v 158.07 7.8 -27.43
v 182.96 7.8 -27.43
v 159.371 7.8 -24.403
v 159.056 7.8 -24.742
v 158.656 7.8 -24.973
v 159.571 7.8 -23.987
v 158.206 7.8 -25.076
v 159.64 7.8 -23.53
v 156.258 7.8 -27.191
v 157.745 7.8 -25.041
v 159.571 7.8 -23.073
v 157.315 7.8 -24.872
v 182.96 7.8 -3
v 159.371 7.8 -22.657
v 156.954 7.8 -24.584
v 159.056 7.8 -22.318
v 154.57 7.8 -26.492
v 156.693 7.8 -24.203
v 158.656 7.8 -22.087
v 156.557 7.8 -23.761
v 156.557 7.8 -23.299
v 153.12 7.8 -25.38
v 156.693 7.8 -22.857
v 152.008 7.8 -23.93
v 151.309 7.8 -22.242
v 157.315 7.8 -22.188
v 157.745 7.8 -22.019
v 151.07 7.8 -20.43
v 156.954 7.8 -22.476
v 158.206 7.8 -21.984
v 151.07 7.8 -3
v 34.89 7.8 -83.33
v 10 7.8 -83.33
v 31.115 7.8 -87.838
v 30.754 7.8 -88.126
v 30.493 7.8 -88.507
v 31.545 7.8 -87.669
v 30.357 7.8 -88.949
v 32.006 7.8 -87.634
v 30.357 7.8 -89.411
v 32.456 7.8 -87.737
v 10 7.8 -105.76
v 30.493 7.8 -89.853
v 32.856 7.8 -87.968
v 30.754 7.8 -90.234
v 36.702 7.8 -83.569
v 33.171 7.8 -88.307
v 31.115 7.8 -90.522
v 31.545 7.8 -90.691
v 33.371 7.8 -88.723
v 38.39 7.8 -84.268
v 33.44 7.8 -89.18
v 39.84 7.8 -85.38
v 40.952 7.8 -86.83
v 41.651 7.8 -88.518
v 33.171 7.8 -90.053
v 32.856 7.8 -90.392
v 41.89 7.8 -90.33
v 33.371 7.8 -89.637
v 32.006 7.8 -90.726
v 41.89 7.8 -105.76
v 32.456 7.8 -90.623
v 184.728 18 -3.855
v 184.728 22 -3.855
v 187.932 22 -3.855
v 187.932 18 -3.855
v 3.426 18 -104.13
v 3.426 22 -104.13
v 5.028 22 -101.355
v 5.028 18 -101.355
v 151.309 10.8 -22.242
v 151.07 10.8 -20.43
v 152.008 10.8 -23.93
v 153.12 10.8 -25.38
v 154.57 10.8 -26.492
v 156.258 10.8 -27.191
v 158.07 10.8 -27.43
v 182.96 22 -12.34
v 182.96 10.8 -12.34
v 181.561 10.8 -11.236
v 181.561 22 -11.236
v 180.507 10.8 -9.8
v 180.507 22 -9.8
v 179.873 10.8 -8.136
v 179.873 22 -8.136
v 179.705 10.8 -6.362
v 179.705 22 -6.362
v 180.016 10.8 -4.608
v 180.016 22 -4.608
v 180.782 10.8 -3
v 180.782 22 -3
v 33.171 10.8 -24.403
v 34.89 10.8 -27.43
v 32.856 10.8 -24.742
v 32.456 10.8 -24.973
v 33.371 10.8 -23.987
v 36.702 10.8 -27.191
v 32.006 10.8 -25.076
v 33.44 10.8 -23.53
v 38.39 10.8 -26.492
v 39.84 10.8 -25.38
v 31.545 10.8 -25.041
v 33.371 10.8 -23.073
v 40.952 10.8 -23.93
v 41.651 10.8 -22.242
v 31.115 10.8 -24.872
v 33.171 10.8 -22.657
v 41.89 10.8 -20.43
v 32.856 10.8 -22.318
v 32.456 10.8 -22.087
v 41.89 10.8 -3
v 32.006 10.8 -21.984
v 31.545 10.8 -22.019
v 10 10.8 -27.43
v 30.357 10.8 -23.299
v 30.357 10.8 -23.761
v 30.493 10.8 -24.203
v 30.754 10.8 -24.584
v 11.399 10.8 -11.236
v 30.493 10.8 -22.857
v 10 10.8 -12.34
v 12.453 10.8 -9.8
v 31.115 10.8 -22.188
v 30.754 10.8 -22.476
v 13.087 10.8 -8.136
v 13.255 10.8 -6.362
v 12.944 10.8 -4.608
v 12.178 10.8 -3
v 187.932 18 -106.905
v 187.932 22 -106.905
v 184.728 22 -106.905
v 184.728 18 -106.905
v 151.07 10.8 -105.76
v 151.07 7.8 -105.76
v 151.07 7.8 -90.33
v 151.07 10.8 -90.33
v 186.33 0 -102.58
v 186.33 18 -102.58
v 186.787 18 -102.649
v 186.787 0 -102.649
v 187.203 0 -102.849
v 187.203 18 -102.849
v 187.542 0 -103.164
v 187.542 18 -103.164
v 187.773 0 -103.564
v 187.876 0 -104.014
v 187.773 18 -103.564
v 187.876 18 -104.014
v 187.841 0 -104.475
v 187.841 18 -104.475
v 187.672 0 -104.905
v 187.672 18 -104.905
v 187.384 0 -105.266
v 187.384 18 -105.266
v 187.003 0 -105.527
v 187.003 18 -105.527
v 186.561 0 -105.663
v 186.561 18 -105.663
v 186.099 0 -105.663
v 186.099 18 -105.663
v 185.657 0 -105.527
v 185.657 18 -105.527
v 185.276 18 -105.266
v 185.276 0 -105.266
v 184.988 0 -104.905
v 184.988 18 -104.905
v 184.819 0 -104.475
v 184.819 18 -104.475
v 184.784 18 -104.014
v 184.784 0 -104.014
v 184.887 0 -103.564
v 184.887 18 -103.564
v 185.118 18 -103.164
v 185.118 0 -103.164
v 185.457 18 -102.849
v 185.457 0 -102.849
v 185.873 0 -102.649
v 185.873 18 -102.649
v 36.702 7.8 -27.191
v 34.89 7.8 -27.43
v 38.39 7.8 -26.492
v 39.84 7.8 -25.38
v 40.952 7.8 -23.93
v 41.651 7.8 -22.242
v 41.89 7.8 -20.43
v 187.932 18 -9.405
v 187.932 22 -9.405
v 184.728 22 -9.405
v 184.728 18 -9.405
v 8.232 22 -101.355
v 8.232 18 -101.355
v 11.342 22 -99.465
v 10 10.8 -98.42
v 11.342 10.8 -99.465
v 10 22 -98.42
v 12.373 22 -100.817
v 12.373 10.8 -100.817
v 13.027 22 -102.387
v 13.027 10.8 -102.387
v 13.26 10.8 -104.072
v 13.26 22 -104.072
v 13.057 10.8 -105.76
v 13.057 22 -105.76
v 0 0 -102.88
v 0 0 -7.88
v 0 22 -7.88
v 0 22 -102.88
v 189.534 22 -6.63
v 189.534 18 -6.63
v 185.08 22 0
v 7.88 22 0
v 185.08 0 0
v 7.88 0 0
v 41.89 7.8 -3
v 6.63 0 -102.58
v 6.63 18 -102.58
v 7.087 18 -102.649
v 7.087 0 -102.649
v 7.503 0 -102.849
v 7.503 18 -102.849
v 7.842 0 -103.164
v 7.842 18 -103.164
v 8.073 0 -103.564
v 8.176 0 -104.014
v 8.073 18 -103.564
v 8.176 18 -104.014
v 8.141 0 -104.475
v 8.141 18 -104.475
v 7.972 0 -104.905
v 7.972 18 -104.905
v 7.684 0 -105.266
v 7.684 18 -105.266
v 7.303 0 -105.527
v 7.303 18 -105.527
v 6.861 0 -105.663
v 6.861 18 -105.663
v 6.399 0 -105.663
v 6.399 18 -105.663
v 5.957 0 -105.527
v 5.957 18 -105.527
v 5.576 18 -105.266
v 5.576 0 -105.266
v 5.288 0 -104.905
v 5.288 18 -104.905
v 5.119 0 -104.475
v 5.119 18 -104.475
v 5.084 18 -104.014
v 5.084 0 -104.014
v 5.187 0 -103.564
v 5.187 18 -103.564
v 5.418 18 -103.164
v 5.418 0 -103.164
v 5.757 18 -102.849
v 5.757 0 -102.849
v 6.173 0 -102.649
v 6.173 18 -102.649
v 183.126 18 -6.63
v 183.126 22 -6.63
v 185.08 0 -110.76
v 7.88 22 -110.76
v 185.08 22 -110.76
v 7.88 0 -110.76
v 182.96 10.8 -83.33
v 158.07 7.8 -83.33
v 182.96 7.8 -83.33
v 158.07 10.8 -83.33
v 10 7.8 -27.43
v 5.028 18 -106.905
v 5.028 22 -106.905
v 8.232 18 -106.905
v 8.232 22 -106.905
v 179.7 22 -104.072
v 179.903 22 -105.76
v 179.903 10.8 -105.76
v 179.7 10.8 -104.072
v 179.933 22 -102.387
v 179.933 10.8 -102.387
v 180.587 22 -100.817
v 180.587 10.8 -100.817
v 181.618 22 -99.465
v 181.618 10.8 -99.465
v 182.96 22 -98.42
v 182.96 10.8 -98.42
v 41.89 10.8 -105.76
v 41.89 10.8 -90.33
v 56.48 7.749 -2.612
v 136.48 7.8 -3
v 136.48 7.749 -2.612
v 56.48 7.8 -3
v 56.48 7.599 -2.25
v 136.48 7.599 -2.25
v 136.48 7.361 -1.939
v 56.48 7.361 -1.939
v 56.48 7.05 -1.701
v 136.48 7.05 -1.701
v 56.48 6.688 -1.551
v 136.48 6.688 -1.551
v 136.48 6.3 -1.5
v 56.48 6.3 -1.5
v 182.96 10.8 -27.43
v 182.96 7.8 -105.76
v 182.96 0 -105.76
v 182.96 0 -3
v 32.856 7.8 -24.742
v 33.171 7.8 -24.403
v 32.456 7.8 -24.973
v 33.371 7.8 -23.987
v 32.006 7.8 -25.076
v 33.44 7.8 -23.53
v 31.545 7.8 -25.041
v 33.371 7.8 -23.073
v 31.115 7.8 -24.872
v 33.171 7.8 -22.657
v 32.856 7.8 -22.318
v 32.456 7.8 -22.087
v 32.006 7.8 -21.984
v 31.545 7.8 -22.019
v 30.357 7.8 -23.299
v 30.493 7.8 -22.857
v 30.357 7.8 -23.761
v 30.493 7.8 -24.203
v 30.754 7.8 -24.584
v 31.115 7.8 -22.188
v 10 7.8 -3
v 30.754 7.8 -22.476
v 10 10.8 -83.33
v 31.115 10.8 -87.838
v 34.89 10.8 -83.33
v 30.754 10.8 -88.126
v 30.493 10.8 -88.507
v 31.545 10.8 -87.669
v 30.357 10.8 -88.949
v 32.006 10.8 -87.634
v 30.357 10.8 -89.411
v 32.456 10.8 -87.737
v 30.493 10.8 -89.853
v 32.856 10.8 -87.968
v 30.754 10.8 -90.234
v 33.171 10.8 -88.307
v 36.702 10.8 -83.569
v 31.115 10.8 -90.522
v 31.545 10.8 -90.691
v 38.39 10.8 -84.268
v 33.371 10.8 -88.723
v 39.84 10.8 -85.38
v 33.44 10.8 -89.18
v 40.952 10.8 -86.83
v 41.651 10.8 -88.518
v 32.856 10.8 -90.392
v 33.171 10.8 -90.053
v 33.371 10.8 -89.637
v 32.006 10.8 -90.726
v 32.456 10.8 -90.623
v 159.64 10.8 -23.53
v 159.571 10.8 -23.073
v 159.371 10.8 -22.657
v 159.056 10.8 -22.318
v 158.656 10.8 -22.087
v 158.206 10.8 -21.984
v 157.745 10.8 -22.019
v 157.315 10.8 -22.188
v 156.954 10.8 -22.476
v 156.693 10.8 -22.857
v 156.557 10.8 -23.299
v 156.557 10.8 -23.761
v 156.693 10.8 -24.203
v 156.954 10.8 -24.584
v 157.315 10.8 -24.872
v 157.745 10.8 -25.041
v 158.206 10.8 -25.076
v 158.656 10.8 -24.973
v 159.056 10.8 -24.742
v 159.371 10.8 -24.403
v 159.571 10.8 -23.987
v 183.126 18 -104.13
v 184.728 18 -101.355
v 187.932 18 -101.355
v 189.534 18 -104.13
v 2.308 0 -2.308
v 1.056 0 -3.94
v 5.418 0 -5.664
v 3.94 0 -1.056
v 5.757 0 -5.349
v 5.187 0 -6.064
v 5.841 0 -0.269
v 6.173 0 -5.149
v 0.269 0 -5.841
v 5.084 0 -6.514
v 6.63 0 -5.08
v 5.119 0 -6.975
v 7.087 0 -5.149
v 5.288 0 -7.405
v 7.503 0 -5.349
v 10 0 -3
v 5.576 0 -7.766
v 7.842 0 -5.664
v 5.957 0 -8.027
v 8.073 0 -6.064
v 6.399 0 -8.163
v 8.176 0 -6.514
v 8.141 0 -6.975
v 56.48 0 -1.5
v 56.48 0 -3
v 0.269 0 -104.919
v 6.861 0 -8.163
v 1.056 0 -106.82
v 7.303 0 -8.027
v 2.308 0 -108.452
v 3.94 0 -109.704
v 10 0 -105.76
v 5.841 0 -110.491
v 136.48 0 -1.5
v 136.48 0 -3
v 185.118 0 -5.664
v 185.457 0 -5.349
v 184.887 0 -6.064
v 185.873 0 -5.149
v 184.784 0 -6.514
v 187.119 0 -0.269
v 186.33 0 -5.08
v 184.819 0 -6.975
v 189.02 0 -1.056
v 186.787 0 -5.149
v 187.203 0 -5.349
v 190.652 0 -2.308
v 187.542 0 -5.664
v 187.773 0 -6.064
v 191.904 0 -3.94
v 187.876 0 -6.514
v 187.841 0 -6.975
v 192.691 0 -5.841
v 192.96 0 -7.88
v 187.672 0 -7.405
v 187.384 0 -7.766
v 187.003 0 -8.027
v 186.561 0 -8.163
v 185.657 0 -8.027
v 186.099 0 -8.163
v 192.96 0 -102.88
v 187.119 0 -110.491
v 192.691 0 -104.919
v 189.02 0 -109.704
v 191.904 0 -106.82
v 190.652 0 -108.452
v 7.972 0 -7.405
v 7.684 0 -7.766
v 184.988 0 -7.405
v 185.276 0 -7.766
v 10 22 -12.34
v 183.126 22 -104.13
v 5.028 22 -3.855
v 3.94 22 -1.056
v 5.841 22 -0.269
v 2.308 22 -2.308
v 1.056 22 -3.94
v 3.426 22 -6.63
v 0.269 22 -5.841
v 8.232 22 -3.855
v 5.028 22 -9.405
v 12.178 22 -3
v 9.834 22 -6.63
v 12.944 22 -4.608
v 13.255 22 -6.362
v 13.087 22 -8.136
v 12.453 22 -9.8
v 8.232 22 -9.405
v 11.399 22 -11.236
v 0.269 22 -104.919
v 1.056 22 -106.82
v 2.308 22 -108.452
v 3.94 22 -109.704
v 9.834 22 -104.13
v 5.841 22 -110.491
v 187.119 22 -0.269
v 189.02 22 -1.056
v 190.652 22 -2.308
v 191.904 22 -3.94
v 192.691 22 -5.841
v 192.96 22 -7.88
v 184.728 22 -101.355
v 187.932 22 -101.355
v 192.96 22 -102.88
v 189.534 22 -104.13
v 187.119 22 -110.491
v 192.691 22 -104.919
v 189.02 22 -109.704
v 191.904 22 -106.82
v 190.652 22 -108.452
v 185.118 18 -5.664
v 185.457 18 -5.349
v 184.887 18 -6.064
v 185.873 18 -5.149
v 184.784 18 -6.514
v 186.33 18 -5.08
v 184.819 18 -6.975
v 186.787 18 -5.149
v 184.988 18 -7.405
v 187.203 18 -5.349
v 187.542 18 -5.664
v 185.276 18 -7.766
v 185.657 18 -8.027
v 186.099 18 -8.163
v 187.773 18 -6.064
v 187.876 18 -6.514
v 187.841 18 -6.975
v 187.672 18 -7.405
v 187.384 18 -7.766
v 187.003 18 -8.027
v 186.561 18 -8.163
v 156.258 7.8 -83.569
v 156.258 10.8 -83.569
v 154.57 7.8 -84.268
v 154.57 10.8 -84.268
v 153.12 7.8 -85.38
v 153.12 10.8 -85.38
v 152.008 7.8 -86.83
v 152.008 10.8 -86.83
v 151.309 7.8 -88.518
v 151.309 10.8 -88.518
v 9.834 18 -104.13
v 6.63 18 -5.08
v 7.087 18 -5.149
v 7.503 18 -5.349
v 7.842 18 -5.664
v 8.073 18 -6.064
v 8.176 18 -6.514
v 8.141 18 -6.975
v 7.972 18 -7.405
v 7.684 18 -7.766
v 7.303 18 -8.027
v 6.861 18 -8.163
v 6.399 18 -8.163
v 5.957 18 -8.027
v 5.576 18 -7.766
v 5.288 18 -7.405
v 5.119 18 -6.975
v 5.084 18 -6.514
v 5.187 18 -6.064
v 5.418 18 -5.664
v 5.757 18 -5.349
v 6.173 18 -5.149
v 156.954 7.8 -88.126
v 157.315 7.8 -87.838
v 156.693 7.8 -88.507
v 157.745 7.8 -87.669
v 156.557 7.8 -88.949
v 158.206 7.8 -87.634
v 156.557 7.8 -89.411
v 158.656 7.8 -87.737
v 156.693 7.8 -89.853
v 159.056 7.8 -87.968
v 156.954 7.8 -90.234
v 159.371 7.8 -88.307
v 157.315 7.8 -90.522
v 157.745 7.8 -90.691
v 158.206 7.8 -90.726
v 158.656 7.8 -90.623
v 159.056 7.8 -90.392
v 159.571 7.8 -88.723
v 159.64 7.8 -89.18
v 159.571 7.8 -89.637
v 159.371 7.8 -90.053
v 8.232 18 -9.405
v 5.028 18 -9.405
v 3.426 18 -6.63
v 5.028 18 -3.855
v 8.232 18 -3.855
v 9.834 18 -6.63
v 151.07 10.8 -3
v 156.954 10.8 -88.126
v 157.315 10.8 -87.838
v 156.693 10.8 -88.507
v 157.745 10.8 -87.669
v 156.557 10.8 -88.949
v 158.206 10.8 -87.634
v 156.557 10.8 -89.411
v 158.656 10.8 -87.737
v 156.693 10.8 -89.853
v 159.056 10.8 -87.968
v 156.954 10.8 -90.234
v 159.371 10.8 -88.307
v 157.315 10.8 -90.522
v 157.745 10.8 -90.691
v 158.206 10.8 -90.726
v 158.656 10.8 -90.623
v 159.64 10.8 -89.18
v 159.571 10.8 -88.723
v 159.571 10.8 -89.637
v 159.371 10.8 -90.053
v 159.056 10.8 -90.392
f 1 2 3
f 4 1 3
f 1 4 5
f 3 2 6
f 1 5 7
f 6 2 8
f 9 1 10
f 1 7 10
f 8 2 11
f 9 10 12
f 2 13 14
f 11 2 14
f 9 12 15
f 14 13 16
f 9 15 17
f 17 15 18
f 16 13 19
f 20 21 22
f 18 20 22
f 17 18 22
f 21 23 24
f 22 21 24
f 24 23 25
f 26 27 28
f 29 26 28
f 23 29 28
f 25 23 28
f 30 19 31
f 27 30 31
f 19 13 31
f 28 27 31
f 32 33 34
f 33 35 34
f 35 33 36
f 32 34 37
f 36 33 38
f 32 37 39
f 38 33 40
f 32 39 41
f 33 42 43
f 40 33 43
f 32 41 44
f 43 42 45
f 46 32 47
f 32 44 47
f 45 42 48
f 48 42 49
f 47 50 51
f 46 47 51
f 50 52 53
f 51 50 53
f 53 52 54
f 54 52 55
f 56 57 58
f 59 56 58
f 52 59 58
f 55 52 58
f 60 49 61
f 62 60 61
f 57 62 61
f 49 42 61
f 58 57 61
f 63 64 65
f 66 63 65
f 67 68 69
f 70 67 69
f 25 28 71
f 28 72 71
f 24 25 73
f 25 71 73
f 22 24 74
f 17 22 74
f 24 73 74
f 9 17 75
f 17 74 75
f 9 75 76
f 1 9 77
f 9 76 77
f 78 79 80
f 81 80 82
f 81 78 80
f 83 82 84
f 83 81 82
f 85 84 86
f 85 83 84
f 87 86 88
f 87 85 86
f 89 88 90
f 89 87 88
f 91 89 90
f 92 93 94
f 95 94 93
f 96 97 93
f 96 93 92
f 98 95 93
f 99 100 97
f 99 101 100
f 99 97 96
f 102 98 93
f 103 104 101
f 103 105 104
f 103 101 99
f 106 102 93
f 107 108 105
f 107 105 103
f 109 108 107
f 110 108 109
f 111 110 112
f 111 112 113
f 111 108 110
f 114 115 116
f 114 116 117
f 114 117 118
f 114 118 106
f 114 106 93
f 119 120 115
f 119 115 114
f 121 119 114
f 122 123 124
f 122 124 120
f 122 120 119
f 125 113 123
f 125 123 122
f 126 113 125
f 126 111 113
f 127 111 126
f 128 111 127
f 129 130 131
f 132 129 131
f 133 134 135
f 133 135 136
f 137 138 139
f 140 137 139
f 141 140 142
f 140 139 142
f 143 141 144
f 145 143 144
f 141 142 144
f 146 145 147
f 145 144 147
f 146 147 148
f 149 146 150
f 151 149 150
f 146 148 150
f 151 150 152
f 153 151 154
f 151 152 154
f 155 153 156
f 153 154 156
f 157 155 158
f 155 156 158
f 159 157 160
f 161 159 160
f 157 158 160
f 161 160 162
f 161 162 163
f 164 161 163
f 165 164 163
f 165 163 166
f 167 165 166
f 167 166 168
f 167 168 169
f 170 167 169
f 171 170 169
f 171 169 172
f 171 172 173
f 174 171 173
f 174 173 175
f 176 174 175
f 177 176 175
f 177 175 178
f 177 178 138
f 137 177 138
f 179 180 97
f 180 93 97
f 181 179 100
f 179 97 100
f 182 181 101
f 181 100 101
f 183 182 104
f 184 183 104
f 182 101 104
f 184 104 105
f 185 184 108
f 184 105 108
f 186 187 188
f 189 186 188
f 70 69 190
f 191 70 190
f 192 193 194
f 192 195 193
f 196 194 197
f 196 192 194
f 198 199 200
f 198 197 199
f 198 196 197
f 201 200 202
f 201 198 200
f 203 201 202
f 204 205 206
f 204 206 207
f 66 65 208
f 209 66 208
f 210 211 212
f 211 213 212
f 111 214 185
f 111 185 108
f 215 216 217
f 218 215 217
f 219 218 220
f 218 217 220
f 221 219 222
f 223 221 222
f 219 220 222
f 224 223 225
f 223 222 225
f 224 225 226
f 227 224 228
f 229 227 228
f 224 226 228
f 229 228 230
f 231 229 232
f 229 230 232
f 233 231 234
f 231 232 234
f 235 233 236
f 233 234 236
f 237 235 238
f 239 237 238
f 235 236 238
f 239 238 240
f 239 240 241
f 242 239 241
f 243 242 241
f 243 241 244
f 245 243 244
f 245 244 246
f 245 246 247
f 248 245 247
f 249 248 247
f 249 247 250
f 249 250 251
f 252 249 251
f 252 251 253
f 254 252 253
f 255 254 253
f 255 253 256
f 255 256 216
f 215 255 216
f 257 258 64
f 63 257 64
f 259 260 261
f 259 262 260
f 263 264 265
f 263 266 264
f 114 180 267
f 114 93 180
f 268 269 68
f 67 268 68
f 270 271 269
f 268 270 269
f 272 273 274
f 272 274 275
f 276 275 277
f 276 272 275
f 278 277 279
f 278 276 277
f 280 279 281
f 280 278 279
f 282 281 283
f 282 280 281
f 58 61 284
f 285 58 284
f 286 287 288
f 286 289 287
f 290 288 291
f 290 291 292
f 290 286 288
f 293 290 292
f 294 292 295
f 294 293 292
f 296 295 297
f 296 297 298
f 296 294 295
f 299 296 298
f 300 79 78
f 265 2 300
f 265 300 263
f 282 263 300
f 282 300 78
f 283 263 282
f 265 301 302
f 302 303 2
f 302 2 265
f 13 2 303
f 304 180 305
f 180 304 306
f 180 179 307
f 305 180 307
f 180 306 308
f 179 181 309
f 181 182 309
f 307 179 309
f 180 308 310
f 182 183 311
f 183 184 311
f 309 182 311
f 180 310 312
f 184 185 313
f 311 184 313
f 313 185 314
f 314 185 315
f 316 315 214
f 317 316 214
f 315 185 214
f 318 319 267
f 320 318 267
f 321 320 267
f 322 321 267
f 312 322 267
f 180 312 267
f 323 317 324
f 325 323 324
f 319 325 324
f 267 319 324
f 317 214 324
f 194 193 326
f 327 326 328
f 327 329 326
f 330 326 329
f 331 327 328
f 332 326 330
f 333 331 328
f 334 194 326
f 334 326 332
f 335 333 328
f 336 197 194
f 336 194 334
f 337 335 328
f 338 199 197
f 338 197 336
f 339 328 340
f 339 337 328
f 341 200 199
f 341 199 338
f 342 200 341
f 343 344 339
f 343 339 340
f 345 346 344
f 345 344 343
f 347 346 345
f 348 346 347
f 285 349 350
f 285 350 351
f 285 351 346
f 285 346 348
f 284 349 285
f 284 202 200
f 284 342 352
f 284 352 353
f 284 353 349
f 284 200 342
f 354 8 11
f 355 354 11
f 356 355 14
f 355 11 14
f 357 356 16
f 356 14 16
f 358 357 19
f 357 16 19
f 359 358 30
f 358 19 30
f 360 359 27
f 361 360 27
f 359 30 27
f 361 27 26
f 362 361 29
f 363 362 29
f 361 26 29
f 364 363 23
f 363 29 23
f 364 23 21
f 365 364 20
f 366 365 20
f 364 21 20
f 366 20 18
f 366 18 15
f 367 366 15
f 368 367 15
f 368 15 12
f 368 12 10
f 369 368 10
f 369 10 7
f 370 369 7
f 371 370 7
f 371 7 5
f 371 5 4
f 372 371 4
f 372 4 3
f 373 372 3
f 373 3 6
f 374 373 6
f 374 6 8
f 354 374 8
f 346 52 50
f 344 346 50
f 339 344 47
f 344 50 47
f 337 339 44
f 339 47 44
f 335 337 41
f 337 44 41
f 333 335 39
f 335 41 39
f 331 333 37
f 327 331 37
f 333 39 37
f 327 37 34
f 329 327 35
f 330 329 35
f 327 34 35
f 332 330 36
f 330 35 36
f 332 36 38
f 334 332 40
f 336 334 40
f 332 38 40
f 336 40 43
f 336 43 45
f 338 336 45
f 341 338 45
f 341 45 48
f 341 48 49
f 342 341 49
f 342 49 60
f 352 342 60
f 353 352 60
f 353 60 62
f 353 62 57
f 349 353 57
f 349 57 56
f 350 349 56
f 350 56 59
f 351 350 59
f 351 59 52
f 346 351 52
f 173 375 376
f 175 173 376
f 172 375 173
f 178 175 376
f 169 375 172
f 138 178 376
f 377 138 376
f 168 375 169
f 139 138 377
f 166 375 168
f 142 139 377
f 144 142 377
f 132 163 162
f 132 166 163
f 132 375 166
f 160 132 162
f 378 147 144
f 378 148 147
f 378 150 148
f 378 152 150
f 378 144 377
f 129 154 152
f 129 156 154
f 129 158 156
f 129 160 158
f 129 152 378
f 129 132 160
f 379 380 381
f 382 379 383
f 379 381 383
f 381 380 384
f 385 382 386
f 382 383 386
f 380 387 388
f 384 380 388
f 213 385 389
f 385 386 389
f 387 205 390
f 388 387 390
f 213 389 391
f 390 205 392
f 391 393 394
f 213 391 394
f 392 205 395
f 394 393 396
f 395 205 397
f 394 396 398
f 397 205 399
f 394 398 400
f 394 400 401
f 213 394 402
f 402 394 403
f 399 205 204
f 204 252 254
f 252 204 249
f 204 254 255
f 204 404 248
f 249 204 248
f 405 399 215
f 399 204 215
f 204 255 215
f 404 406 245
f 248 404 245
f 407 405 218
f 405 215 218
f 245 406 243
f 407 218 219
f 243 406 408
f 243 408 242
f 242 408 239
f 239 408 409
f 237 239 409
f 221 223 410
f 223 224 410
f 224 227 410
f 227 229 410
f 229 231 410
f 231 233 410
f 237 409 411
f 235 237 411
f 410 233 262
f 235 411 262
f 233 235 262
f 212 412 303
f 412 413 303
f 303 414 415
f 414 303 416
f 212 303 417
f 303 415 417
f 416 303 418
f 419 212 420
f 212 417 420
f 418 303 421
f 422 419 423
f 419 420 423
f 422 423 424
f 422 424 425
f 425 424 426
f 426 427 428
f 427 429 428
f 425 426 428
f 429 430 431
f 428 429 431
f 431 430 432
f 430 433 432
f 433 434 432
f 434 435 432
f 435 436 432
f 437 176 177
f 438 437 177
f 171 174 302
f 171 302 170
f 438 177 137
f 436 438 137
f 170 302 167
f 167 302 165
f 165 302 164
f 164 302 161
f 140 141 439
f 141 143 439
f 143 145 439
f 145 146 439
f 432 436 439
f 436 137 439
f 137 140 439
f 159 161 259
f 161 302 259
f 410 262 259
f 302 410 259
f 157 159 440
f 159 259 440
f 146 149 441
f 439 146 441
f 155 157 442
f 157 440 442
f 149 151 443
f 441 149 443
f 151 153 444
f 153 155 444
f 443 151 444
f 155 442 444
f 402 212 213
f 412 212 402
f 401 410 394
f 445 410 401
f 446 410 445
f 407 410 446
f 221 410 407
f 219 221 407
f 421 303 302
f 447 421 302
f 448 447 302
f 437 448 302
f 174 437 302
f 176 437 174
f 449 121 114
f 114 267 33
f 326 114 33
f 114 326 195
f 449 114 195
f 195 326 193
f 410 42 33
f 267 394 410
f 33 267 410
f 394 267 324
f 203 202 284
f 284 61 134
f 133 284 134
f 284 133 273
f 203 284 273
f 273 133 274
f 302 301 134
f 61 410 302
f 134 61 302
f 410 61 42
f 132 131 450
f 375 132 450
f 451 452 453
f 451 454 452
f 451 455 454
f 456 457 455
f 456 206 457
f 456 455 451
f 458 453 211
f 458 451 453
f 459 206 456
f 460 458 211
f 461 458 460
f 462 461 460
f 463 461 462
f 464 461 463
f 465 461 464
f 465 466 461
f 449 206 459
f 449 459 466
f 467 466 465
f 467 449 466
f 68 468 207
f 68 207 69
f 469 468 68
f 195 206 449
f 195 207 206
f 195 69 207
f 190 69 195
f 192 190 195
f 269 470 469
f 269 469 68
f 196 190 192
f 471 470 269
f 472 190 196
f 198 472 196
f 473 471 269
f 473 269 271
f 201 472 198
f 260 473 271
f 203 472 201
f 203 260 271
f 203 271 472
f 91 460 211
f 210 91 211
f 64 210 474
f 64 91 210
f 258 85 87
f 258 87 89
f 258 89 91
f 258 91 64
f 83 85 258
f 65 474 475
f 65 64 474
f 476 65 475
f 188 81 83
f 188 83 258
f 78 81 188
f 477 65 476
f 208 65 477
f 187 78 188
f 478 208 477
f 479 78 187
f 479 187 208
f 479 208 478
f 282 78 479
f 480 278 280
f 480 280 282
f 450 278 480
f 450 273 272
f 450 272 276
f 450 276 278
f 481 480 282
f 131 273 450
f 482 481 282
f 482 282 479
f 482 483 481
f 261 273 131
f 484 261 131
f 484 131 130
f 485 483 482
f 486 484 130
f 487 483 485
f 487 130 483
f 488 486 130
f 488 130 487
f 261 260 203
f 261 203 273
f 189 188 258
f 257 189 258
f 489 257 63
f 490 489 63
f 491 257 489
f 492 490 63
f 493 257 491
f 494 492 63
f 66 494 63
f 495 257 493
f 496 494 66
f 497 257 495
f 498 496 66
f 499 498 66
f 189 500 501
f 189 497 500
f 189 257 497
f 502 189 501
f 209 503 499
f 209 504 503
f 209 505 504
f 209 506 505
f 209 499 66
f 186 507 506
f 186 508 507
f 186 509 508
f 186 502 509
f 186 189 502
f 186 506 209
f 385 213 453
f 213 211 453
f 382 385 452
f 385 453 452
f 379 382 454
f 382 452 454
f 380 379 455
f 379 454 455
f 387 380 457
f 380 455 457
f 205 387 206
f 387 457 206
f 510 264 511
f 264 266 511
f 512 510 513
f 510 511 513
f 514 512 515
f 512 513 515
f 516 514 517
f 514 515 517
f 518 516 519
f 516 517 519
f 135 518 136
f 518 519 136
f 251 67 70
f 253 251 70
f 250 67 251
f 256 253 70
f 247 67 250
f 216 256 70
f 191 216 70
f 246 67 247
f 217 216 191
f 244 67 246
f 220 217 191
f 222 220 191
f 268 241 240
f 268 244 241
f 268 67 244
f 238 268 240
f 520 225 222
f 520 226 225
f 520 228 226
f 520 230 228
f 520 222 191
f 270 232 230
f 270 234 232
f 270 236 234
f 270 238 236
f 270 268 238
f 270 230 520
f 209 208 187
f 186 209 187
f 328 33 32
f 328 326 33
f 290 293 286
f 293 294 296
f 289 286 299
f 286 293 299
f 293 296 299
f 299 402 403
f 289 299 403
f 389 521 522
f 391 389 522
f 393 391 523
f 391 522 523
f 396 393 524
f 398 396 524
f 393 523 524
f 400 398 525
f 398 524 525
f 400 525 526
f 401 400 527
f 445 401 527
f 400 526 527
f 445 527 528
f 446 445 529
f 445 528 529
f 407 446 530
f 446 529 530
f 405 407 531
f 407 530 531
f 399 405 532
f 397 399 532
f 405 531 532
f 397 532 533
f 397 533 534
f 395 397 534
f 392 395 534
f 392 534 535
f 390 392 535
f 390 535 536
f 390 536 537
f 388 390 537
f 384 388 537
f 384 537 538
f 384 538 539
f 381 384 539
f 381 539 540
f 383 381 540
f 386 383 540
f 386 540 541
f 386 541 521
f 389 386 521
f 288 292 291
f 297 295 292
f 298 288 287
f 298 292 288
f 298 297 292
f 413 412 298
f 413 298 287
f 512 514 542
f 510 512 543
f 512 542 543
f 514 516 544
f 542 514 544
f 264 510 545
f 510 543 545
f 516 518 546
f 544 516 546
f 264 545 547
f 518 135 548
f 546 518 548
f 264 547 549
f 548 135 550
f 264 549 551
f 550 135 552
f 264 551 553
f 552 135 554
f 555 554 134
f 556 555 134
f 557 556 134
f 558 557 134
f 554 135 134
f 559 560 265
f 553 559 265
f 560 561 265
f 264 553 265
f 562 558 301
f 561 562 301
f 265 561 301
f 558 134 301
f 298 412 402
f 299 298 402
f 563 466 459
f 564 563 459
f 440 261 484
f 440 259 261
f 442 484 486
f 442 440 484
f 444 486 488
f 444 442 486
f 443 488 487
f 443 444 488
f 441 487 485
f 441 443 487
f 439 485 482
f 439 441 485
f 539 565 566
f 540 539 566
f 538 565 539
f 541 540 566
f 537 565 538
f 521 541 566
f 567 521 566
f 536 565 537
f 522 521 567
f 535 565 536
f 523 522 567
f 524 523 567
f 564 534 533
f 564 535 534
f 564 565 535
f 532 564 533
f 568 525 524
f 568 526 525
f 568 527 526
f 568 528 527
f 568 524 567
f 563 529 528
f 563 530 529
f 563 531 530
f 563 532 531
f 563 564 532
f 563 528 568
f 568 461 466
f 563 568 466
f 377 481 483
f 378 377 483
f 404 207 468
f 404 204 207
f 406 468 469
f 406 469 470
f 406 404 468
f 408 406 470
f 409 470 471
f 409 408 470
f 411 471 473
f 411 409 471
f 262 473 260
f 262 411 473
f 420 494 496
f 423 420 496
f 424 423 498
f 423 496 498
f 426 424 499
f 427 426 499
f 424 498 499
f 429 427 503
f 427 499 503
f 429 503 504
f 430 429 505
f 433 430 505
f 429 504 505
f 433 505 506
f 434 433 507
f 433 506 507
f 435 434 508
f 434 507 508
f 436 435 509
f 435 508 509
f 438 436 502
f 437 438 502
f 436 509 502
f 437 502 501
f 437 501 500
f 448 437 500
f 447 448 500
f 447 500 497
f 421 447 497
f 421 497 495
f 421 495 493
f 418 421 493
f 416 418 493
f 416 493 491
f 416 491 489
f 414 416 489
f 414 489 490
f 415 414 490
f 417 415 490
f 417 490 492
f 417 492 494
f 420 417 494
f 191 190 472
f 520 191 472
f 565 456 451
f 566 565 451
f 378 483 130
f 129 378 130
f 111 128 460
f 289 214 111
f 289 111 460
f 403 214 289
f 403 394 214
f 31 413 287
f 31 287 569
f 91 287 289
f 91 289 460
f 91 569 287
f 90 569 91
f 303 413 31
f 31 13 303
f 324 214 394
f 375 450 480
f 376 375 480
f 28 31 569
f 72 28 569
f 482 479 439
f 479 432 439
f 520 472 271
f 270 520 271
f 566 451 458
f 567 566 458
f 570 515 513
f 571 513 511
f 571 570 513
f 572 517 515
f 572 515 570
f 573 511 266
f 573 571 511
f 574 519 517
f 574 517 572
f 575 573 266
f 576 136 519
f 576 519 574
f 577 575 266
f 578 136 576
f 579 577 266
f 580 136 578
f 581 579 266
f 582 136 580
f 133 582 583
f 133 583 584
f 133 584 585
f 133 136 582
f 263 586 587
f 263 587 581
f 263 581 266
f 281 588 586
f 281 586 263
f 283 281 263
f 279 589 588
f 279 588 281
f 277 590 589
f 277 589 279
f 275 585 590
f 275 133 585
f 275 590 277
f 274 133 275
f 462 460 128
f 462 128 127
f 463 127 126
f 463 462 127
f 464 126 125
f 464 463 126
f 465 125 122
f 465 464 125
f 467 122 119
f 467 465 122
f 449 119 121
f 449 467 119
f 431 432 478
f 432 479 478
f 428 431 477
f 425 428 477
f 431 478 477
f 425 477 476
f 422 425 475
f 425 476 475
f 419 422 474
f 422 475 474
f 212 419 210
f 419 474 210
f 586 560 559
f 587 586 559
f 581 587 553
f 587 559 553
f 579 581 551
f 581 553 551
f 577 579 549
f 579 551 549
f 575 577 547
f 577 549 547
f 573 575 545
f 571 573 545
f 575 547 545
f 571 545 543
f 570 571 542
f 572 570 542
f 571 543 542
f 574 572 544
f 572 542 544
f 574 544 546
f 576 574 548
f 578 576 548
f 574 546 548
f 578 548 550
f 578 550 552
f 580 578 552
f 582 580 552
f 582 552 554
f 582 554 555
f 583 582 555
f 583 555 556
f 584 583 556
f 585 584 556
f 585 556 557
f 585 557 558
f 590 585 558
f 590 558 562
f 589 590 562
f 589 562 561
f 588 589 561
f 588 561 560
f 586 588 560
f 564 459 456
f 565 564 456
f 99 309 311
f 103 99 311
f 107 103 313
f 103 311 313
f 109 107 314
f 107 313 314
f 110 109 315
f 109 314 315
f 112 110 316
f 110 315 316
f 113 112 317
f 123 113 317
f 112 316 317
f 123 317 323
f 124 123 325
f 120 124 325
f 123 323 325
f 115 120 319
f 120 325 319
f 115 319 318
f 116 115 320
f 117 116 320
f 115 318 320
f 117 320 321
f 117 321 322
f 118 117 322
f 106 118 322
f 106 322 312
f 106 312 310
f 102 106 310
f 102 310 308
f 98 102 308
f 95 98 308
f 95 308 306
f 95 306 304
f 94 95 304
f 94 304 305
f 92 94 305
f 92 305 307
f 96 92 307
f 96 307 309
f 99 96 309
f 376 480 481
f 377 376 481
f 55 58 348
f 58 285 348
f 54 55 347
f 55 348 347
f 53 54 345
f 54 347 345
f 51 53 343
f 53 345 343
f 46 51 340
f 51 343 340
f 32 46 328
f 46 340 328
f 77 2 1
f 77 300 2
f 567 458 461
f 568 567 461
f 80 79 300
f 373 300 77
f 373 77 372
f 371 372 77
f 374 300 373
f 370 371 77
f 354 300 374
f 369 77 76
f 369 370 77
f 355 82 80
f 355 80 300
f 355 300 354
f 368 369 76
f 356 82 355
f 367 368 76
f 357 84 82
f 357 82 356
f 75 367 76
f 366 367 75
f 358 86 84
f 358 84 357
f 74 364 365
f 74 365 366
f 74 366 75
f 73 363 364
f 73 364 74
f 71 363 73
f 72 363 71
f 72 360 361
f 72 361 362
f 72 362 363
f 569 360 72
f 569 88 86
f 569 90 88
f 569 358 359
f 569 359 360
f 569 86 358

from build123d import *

# Parameters (mm, degrees)
CROQUIS1_W              = 192.96
CROQUIS1_H              = 110.76
CROQUIS1_W_2            = 172.96
CROQUIS1_H_2            = 102.76
SALIENTE_EXTRUIR2_DEPTH = 18
CROQUIS2_W              = 31.89
CROQUIS2_H              = 3
SALIENTE_EXTRUIR3_DEPTH = 24.43
CROQUIS3_W              = 31.89
CROQUIS3_H              = 3
SALIENTE_EXTRUIR4_DEPTH = 22.43
CROQUIS1_2_W            = 192.96
CROQUIS1_2_H            = 110.76
CROQUIS1_2_W_2          = 172.96
CROQUIS1_2_H_2          = 102.76
SALIENTE_EXTRUIR5_DEPTH = 22
CROQUIS6_R              = 6.63
SALIENTE_EXTRUIR6_DEPTH = 22
CROQUIS7_R              = 1.55
CORTAR_EXTRUIR1_DEPTH   = 22
CORTAR_EXTRUIR2_DEPTH   = 4
REDONDEO1_R             = 7.88
REDONDEO2_R             = 7.88
REDONDEO3_R             = 7.88
REDONDEO4_R             = 7.88
CROQUIS9_R              = 1.55
CORTAR_EXTRUIR3_DEPTH   = 4
CROQUIS10_W             = 172.96
CROQUIS10_H             = 102.76
CORTAR_EXTRUIR5_DEPTH   = 7.8
REDONDEO5_R             = 7
REDONDEO6_R             = 7
REDONDEO7_R             = 7
REDONDEO8_R             = 7
CROQUIS11_W             = 80
CROQUIS11_H             = 1.5
CORTAR_EXTRUIR6_DEPTH   = 7.8
REDONDEO9_R             = 1.5


with BuildPart() as part:
    # Croquis1 → Saliente-Extruir2 (new body)
    with BuildSketch(Plane(origin=(0, 0, 0), x_dir=(1, 0, 0), z_dir=(0, 1, 0))):
        with Locations((96.48, 55.38)):
            Rectangle(CROQUIS1_W, CROQUIS1_H)
        with Locations((96.48, 54.38)):
            Rectangle(CROQUIS1_W_2, CROQUIS1_H_2, mode=Mode.SUBTRACT)
    extrude(amount=SALIENTE_EXTRUIR2_DEPTH)

    # Croquis2 → Saliente-Extruir3 (add)
    with BuildSketch(Plane(origin=(0, 0, -3), x_dir=(-1, 0, 0), z_dir=(0, 0, -1))):
        with Locations((-25.945, 9.3)):
            Rectangle(CROQUIS2_W, CROQUIS2_H)
        with Locations((-167.015, 9.3)):
            Rectangle(CROQUIS2_W, CROQUIS2_H)
    extrude(amount=SALIENTE_EXTRUIR3_DEPTH)

    # Croquis3 → Saliente-Extruir4 (add)
    with BuildSketch(Plane.XY.offset(-105.76)):
        with Locations((167.015, 9.3)):
            Rectangle(CROQUIS3_W, CROQUIS3_H)
        with Locations((25.945, 9.3)):
            Rectangle(CROQUIS3_W, CROQUIS3_H)
    extrude(amount=SALIENTE_EXTRUIR4_DEPTH)

    # Croquis1<2> → Saliente-Extruir5 (add)
    with BuildSketch(Plane(origin=(0, 0, 0), x_dir=(1, 0, 0), z_dir=(0, 1, 0))):
        with Locations((96.48, 55.38)):
            Rectangle(CROQUIS1_2_W, CROQUIS1_2_H)
        with Locations((96.48, 54.38)):
            Rectangle(CROQUIS1_2_W_2, CROQUIS1_2_H_2, mode=Mode.SUBTRACT)
    extrude(amount=SALIENTE_EXTRUIR5_DEPTH)

    # Croquis6 → Saliente-Extruir6 (add)
    with BuildSketch(Plane(origin=(0, 22, 0), x_dir=(1, 0, 0), z_dir=(0, 1, 0))):
        with Locations((6.63, 6.63)):
            Circle(CROQUIS6_R)
        with Locations((6.63, 104.13)):
            Circle(CROQUIS6_R)
        with Locations((186.33, 104.13)):
            Circle(CROQUIS6_R)
        with Locations((186.33, 6.63)):
            Circle(CROQUIS6_R)
    extrude(amount=-SALIENTE_EXTRUIR6_DEPTH)

    # Croquis7 → Cortar-Extruir1 (cut)
    with BuildSketch(Plane(origin=(0, 22, 0), x_dir=(1, 0, 0), z_dir=(0, 1, 0))):
        with Locations(Location((6.63, 104.13, 0), (0, 0, 270))):
            Circle(CROQUIS7_R)
        with Locations(Location((186.33, 104.13, 0), (0, 0, 270))):
            Circle(CROQUIS7_R)
        with Locations(Location((186.33, 6.63, 0), (0, 0, 270))):
            Circle(CROQUIS7_R)
        with Locations(Location((6.63, 6.63, 0), (0, 0, 270))):
            Circle(CROQUIS7_R)
    extrude(amount=-CORTAR_EXTRUIR1_DEPTH, mode=Mode.SUBTRACT)

    # Croquis8 → Cortar-Extruir2 (cut)
    with BuildSketch(Plane(origin=(0, 22, 0), x_dir=(1, 0, 0), z_dir=(0, 1, 0))):
        Polygon((189.534293994, 6.63), (187.932146997, 9.405), (184.727853003, 9.405), (183.125706006, 6.63), (184.727853003, 3.855), (187.932146997, 3.855), align=None)
        Polygon((189.534293994, 104.13), (187.932146997, 106.905), (184.727853003, 106.905), (183.125706006, 104.13), (184.727853003, 101.355), (187.932146997, 101.355), align=None)
        Polygon((9.834293994, 6.63), (8.232146997, 9.405), (5.027853003, 9.405), (3.425706006, 6.63), (5.027853003, 3.855), (8.232146997, 3.855), align=None)
        Polygon((9.834293994, 104.13), (8.232146997, 106.905), (5.027853003, 106.905), (3.425706006, 104.13), (5.027853003, 101.355), (8.232146997, 101.355), align=None)
    extrude(amount=-CORTAR_EXTRUIR2_DEPTH, mode=Mode.SUBTRACT)

    # Redondeo1
    redondeo1_edges = [part.edges().sort_by_distance(p)[0] for p in [
        (0, 11, 0),
    ]]
    fillet(redondeo1_edges, radius=REDONDEO1_R)

    # Redondeo2
    redondeo2_edges = [part.edges().sort_by_distance(p)[0] for p in [
        (0, 11, -110.76),
    ]]
    fillet(redondeo2_edges, radius=REDONDEO2_R)

    # Redondeo3
    redondeo3_edges = [part.edges().sort_by_distance(p)[0] for p in [
        (192.96, 11, -110.76),
    ]]
    fillet(redondeo3_edges, radius=REDONDEO3_R)

    # Redondeo4
    redondeo4_edges = [part.edges().sort_by_distance(p)[0] for p in [
        (192.96, 11, 0),
    ]]
    fillet(redondeo4_edges, radius=REDONDEO4_R)

    # Croquis9 → Cortar-Extruir3 (cut)
    with BuildSketch(Plane.XZ.offset(-7.8)):
        with Locations((158.09, -89.18)):
            Circle(CROQUIS9_R)
        with Locations((158.09, -23.53)):
            Circle(CROQUIS9_R)
        with Locations((31.89, -89.18)):
            Circle(CROQUIS9_R)
        with Locations((31.89, -23.53)):
            Circle(CROQUIS9_R)
    extrude(amount=-CORTAR_EXTRUIR3_DEPTH, mode=Mode.SUBTRACT)

    # Croquis10 → Cortar-Extruir5 (cut)
    with BuildSketch(Plane.XZ):
        with Locations((96.48, -54.38)):
            Rectangle(CROQUIS10_W, CROQUIS10_H)
    extrude(amount=-CORTAR_EXTRUIR5_DEPTH, mode=Mode.SUBTRACT)

    # Redondeo5
    redondeo5_edges = [part.edges().sort_by_distance(p)[0] for p in [
        (151.07, 9.3, -27.43),
    ]]
    fillet(redondeo5_edges, radius=REDONDEO5_R)

    # Redondeo6
    redondeo6_edges = [part.edges().sort_by_distance(p)[0] for p in [
        (151.07, 9.3, -83.33),
    ]]
    fillet(redondeo6_edges, radius=REDONDEO6_R)

    # Redondeo7
    redondeo7_edges = [part.edges().sort_by_distance(p)[0] for p in [
        (41.89, 9.3, -83.33),
    ]]
    fillet(redondeo7_edges, radius=REDONDEO7_R)

    # Redondeo8
    redondeo8_edges = [part.edges().sort_by_distance(p)[0] for p in [
        (41.89, 9.3, -27.43),
    ]]
    fillet(redondeo8_edges, radius=REDONDEO8_R)

    # Croquis11 → Cortar-Extruir6 (cut)
    with BuildSketch(Plane(origin=(0, 0, 0), x_dir=(-1, 0, 0), z_dir=(0, -1, 0))):
        with Locations((-96.48, 2.25)):
            Rectangle(CROQUIS11_W, CROQUIS11_H)
    extrude(amount=-CORTAR_EXTRUIR6_DEPTH, mode=Mode.SUBTRACT)

    # Redondeo9
    redondeo9_edges = [part.edges().sort_by_distance(p)[0] for p in [
        (96.48, 7.8, -1.5),
    ]]
    fillet(redondeo9_edges, radius=REDONDEO9_R - 0.0001)  # a hair under: the kernel refuses the full size


solid = part.part
